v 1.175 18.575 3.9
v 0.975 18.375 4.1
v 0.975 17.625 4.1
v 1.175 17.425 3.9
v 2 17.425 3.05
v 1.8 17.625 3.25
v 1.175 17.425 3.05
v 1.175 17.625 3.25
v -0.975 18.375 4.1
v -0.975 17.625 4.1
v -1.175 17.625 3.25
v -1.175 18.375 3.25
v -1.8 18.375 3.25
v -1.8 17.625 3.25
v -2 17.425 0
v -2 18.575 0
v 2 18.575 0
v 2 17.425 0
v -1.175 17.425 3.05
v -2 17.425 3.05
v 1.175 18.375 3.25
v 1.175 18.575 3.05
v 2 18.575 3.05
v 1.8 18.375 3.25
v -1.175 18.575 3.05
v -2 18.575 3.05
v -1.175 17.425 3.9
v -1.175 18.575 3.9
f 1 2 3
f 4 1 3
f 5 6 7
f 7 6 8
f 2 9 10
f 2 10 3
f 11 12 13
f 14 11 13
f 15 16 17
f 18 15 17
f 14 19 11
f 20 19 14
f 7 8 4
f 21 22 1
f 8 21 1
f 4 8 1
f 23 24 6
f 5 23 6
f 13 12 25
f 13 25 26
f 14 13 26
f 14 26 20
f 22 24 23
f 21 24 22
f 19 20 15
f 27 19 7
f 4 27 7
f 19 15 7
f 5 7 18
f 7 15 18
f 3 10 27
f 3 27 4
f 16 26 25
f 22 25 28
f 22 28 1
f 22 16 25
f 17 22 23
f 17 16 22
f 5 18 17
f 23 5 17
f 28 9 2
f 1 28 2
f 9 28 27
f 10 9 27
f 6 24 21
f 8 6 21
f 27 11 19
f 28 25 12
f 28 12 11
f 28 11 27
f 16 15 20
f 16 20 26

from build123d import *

# Parameters (mm, degrees)
SKETCH008_W     = 4
SKETCH008_H     = 1.15
PAD005_DEPTH    = 4.1
SKETCH009_W     = 0.825
SKETCH009_H     = 0.85
POCKET002_DEPTH = 5
CHAMFER005_SIZE = 0.2


with BuildPart() as part:
    # Sketch008 → Pad005 (new body)
    with BuildSketch(Plane.XY):
        Rectangle(SKETCH008_W, SKETCH008_H)
    extrude(amount=PAD005_DEPTH)

    # Sketch009 (on Face1 of Pad005) → Pocket002 (cut)
    with BuildSketch(Plane(origin=(0, 0.575, 0), x_dir=(-1, 0, 0), z_dir=(0, 1, 0))):
        with Locations((-1.5875, 3.675)):
            Rectangle(SKETCH009_W, SKETCH009_H)
        with Locations((1.5875, 3.675)):
            Rectangle(SKETCH009_W, SKETCH009_H)
    extrude(amount=-POCKET002_DEPTH, mode=Mode.SUBTRACT)

    # Chamfer005
    chamfer005_edges = [part.edges().sort_by_distance(p)[0] for p in [
        (0, 0.575, 4.1),
        (0, -0.575, 4.1),
        (1.5875, 0.575, 3.25),
        (-1.5875, 0.575, 3.25),
        (-1.5875, -0.575, 3.25),
        (1.5875, -0.575, 3.25),
        (2, 0, 3.25),
        (-2, 0, 3.25),
        (1.175, 0, 4.1),
        (-1.175, 0, 4.1),
    ]]
    chamfer(chamfer005_edges, length=CHAMFER005_SIZE)


with BuildPart() as part_1:
    # Body037 placement: moved
    add(part.part.moved(Location((0, 18, 0))))


solid = part_1.part
